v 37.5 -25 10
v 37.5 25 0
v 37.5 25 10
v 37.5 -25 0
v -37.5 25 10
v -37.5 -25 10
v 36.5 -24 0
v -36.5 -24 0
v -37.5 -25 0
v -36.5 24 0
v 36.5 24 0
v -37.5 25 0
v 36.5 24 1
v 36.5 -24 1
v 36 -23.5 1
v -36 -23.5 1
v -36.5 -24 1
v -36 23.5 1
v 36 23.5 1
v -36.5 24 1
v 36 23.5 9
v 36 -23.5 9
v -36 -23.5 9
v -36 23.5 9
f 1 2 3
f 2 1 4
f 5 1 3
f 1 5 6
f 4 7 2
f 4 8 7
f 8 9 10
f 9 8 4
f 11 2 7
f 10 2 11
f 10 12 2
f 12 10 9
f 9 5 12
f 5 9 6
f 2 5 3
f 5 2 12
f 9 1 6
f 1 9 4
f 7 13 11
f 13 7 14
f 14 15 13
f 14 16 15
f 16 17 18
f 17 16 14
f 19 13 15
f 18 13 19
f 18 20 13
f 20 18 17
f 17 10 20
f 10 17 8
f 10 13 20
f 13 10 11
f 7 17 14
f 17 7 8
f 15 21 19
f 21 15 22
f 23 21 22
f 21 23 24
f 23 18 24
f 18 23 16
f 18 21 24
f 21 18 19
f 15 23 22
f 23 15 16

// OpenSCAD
width=75;
length=50;
height=10;

$fn=50;


difference(){
translate([-width/2,-length/2,0]) cube([width,length,height]);
translate([-(width-2)/2,-(length-2)/2,-1]) cube([width-2,length-2,2]);
translate([-(width-3)/2,-(length-3)/2,-1]) cube([width-3,length-3,height]);
}
